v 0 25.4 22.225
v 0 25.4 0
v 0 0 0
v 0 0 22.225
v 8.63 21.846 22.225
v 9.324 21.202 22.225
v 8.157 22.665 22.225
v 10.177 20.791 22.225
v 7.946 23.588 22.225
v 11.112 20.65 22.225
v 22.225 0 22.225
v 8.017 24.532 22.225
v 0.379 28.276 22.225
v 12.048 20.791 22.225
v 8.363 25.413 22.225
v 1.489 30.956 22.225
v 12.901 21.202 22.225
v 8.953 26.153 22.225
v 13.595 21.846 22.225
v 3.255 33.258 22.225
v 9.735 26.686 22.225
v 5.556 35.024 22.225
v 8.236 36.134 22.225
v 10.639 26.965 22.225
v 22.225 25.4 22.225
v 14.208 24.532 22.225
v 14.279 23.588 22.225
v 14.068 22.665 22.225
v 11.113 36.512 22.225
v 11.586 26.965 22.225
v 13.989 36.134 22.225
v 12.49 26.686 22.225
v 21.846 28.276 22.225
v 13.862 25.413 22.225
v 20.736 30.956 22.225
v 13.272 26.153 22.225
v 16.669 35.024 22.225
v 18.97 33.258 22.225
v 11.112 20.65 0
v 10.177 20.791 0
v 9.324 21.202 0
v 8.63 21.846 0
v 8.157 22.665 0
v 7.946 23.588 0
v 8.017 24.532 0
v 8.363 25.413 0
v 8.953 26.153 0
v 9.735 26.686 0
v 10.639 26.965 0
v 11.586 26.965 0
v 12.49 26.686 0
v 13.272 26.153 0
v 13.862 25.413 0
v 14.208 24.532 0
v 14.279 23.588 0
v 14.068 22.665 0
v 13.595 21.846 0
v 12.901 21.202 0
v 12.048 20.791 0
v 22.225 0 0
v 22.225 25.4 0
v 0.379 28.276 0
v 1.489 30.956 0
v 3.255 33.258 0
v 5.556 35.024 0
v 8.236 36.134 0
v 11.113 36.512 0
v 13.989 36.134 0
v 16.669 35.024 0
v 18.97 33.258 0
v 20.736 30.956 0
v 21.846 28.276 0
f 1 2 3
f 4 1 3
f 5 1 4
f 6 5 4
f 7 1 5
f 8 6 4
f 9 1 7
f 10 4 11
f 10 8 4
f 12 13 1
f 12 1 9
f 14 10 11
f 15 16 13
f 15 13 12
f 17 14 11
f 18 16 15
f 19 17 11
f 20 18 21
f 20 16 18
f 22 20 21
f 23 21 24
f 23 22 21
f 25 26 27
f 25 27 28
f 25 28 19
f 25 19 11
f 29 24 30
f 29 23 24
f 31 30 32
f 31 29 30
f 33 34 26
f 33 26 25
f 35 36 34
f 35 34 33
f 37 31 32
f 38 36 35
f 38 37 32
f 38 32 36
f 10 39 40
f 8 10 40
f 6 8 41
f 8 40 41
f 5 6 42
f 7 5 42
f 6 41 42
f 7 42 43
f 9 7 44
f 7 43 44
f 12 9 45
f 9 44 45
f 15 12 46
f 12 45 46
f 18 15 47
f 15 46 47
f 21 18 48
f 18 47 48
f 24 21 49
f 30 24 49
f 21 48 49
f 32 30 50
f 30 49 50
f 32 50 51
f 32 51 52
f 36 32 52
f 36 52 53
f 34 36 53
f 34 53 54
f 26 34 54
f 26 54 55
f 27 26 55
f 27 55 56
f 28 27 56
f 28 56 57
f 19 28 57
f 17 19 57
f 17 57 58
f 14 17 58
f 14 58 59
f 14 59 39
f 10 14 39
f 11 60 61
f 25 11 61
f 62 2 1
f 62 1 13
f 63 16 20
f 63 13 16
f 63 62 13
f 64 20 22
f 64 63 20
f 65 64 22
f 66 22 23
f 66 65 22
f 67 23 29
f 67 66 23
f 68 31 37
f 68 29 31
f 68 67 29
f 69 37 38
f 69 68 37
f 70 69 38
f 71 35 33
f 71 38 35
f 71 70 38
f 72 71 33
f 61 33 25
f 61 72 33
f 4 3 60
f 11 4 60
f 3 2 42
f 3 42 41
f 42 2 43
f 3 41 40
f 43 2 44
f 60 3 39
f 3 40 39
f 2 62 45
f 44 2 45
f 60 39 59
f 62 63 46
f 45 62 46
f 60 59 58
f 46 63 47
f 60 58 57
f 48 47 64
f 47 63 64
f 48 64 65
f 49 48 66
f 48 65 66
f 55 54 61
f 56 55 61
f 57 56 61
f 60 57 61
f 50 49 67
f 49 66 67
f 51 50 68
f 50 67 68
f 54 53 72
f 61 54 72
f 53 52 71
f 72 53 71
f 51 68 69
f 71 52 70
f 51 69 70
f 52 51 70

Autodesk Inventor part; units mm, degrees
ref_plane "YZ Plane" through (0, 0, 0) normal (1, 0, 0) x (0, 1, 0)
ref_plane "XZ Plane" through (0, 0, 0) normal (0, 1, 0) x (-1, 0, 0)
ref_plane "XY Plane" through (0, 0, 0) normal (0, 0, 1) x (1, 0, 0)
sketch "Sketch1" plane through (0, 0, 0) normal (0, 0, 1) x (1, 0, 0)
  line L0 (0, 0) -> (22.225, 0)
  line L1 (22.225, 0) -> (22.225, 25.4)
  line L2 (22.225, 25.4) -> (0, 25.4)
  line L3 (0, 25.4) -> (0, 0)
  arc A0 (22.225, 25.4) -> (0, 25.4) centre (11.1125, 25.4) ccw
  dimension "d0" = 25.4
  dimension "d1" = 22.225
  dimension "d4" = 11.1125
extrude "Extrusion2" add sketch "Sketch1" along normal blind 22.225
sketch "Sketch2" plane through (0, 0, 22.225) normal (0, 0, 1) x (1, 0, 0)
  line L0 (0, 0) -> (22.225, 0) projected
  line L1 (22.225, 0) -> (22.225, 25.4) projected
  point P0 (11.1125, 23.8252)
  dimension "d7" = 23.8252
  dimension "d8" = 11.1125
hole "Hole1" at (11.1125, 23.8252, 22.225) direction (0, 0, -1) diameter 6.35 end through all
properties part number "CLB_053_ScissorTopBarPlug" material "Nylon 6/6"
